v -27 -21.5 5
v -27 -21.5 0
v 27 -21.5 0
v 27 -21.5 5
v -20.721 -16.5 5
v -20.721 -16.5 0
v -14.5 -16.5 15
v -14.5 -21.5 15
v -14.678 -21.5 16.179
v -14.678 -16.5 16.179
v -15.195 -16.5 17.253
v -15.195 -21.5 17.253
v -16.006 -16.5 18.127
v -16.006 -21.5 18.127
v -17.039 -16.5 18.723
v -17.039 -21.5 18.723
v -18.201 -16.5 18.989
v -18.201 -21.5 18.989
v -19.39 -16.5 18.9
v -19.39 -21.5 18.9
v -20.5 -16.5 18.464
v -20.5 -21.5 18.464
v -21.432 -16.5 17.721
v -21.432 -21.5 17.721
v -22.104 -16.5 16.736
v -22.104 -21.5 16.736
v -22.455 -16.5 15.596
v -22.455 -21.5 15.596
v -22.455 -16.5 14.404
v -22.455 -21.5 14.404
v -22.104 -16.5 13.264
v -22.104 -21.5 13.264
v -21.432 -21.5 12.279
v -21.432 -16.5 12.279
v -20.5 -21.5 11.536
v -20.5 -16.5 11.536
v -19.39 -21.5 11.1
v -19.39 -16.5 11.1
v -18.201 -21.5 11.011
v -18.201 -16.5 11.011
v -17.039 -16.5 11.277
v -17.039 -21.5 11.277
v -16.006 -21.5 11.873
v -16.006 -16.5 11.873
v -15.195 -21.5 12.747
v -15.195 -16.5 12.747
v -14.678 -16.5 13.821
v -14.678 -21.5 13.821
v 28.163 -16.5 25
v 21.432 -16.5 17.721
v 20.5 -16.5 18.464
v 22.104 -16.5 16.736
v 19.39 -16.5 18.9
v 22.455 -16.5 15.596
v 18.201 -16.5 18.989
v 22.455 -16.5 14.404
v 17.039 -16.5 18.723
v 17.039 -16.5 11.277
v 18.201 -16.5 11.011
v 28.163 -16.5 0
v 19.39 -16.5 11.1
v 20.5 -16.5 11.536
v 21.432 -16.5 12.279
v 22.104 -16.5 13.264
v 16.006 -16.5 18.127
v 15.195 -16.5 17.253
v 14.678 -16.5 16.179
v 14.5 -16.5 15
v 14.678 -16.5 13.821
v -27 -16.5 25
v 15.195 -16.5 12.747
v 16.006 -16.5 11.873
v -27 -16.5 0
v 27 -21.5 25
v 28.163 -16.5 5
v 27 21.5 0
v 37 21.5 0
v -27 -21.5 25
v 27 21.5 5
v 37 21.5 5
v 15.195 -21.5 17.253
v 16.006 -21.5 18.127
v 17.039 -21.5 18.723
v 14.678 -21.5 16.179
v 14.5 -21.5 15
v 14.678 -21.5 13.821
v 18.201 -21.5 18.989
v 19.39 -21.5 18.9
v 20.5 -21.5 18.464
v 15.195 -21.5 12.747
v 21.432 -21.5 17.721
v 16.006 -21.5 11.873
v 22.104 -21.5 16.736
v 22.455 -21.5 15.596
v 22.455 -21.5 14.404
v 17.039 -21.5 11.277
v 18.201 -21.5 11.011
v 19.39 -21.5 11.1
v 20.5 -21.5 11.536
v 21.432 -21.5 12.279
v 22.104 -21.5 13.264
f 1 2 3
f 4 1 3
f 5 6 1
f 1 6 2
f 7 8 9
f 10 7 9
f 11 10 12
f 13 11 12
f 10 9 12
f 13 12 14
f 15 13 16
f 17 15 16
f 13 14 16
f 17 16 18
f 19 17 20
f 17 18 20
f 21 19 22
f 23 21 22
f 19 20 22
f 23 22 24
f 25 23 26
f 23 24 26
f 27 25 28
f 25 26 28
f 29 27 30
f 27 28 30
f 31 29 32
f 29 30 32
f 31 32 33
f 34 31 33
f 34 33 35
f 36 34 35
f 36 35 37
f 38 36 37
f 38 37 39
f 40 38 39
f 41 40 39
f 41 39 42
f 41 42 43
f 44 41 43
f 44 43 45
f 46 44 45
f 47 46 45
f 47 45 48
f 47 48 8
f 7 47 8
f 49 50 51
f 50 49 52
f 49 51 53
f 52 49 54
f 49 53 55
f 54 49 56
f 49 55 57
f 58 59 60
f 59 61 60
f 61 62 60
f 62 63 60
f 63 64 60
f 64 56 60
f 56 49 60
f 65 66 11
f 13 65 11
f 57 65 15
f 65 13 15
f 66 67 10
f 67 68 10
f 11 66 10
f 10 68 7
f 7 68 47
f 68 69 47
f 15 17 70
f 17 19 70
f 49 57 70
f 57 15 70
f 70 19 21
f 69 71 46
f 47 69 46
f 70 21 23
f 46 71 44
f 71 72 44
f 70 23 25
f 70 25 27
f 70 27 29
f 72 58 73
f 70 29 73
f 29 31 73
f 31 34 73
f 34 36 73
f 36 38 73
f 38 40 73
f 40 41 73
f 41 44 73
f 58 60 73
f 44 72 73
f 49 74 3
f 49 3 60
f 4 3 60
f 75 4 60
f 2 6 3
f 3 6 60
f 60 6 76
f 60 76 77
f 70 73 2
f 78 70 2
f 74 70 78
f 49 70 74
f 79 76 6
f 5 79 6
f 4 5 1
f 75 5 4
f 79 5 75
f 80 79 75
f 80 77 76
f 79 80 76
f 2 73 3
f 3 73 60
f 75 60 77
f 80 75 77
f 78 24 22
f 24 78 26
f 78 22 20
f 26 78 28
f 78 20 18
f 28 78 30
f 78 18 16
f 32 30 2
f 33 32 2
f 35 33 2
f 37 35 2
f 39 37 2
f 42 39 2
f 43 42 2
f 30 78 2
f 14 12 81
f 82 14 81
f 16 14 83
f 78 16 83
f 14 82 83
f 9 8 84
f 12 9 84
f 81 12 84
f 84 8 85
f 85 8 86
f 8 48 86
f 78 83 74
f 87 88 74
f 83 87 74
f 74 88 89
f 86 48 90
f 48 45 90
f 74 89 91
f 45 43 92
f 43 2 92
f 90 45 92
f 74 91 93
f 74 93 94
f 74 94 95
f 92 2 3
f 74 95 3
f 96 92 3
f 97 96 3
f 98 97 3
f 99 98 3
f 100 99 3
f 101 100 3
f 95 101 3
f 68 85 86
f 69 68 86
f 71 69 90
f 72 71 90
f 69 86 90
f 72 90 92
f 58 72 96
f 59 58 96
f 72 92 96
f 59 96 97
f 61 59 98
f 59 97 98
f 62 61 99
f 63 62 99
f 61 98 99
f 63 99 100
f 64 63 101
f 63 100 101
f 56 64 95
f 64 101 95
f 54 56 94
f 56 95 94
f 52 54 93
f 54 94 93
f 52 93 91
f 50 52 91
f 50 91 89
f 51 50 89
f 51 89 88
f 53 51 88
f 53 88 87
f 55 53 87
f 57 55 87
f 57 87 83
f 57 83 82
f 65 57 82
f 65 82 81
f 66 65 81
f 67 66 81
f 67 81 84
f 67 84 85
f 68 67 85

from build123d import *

# Parameters (mm, degrees)
F1_DEPTH = 5
F2_DEPTH = 25
F3_R     = 4
F4_DEPTH = 10


with BuildPart() as f1:
    # F0 (on Top) → F1 (new body)
    with BuildSketch(Plane.XY):
        Polygon((28.1627906977, -16.5), (27, -16.5), (27, -21.5), align=None)
        Polygon((27, -21.5), (27, -16.5), (-20.7209302326, -16.5), (-27, -21.5), align=None)
        Polygon((27, -16.5), (27, 21.5), (-20.7209302326, -16.5), align=None)
        Polygon((37, 21.5), (27, 21.5), (27, -16.5), (28.1627906977, -16.5), align=None)
    extrude(amount=F1_DEPTH)


with BuildPart() as f2:
    # F0 (on Top) → F2 (new body)
    with BuildSketch(Plane.XY):
        Polygon((27, -21.5), (27, -16.5), (-20.7209302326, -16.5), (-27, -21.5), align=None)
        Polygon((28.1627906977, -16.5), (27, -16.5), (27, -21.5), align=None)
        Polygon((-27, -21.5), (-20.7209302326, -16.5), (-27, -16.5), align=None)
    extrude(amount=F2_DEPTH)

    # F3 (on face) → F4 (cut)
    with BuildSketch(Plane.XZ.offset(21.5)):
        with Locations((-18.5, 15)):
            Circle(F3_R)
        with BuildLine():
            ThreePointArc((22.5, 15), (18.5, 19), (14.5, 15))
            ThreePointArc((14.5, 15), (18.5, 11), (22.5, 15))
        make_face()
    extrude(amount=-F4_DEPTH, mode=Mode.SUBTRACT)


solid = Compound([f1.part, f2.part])
